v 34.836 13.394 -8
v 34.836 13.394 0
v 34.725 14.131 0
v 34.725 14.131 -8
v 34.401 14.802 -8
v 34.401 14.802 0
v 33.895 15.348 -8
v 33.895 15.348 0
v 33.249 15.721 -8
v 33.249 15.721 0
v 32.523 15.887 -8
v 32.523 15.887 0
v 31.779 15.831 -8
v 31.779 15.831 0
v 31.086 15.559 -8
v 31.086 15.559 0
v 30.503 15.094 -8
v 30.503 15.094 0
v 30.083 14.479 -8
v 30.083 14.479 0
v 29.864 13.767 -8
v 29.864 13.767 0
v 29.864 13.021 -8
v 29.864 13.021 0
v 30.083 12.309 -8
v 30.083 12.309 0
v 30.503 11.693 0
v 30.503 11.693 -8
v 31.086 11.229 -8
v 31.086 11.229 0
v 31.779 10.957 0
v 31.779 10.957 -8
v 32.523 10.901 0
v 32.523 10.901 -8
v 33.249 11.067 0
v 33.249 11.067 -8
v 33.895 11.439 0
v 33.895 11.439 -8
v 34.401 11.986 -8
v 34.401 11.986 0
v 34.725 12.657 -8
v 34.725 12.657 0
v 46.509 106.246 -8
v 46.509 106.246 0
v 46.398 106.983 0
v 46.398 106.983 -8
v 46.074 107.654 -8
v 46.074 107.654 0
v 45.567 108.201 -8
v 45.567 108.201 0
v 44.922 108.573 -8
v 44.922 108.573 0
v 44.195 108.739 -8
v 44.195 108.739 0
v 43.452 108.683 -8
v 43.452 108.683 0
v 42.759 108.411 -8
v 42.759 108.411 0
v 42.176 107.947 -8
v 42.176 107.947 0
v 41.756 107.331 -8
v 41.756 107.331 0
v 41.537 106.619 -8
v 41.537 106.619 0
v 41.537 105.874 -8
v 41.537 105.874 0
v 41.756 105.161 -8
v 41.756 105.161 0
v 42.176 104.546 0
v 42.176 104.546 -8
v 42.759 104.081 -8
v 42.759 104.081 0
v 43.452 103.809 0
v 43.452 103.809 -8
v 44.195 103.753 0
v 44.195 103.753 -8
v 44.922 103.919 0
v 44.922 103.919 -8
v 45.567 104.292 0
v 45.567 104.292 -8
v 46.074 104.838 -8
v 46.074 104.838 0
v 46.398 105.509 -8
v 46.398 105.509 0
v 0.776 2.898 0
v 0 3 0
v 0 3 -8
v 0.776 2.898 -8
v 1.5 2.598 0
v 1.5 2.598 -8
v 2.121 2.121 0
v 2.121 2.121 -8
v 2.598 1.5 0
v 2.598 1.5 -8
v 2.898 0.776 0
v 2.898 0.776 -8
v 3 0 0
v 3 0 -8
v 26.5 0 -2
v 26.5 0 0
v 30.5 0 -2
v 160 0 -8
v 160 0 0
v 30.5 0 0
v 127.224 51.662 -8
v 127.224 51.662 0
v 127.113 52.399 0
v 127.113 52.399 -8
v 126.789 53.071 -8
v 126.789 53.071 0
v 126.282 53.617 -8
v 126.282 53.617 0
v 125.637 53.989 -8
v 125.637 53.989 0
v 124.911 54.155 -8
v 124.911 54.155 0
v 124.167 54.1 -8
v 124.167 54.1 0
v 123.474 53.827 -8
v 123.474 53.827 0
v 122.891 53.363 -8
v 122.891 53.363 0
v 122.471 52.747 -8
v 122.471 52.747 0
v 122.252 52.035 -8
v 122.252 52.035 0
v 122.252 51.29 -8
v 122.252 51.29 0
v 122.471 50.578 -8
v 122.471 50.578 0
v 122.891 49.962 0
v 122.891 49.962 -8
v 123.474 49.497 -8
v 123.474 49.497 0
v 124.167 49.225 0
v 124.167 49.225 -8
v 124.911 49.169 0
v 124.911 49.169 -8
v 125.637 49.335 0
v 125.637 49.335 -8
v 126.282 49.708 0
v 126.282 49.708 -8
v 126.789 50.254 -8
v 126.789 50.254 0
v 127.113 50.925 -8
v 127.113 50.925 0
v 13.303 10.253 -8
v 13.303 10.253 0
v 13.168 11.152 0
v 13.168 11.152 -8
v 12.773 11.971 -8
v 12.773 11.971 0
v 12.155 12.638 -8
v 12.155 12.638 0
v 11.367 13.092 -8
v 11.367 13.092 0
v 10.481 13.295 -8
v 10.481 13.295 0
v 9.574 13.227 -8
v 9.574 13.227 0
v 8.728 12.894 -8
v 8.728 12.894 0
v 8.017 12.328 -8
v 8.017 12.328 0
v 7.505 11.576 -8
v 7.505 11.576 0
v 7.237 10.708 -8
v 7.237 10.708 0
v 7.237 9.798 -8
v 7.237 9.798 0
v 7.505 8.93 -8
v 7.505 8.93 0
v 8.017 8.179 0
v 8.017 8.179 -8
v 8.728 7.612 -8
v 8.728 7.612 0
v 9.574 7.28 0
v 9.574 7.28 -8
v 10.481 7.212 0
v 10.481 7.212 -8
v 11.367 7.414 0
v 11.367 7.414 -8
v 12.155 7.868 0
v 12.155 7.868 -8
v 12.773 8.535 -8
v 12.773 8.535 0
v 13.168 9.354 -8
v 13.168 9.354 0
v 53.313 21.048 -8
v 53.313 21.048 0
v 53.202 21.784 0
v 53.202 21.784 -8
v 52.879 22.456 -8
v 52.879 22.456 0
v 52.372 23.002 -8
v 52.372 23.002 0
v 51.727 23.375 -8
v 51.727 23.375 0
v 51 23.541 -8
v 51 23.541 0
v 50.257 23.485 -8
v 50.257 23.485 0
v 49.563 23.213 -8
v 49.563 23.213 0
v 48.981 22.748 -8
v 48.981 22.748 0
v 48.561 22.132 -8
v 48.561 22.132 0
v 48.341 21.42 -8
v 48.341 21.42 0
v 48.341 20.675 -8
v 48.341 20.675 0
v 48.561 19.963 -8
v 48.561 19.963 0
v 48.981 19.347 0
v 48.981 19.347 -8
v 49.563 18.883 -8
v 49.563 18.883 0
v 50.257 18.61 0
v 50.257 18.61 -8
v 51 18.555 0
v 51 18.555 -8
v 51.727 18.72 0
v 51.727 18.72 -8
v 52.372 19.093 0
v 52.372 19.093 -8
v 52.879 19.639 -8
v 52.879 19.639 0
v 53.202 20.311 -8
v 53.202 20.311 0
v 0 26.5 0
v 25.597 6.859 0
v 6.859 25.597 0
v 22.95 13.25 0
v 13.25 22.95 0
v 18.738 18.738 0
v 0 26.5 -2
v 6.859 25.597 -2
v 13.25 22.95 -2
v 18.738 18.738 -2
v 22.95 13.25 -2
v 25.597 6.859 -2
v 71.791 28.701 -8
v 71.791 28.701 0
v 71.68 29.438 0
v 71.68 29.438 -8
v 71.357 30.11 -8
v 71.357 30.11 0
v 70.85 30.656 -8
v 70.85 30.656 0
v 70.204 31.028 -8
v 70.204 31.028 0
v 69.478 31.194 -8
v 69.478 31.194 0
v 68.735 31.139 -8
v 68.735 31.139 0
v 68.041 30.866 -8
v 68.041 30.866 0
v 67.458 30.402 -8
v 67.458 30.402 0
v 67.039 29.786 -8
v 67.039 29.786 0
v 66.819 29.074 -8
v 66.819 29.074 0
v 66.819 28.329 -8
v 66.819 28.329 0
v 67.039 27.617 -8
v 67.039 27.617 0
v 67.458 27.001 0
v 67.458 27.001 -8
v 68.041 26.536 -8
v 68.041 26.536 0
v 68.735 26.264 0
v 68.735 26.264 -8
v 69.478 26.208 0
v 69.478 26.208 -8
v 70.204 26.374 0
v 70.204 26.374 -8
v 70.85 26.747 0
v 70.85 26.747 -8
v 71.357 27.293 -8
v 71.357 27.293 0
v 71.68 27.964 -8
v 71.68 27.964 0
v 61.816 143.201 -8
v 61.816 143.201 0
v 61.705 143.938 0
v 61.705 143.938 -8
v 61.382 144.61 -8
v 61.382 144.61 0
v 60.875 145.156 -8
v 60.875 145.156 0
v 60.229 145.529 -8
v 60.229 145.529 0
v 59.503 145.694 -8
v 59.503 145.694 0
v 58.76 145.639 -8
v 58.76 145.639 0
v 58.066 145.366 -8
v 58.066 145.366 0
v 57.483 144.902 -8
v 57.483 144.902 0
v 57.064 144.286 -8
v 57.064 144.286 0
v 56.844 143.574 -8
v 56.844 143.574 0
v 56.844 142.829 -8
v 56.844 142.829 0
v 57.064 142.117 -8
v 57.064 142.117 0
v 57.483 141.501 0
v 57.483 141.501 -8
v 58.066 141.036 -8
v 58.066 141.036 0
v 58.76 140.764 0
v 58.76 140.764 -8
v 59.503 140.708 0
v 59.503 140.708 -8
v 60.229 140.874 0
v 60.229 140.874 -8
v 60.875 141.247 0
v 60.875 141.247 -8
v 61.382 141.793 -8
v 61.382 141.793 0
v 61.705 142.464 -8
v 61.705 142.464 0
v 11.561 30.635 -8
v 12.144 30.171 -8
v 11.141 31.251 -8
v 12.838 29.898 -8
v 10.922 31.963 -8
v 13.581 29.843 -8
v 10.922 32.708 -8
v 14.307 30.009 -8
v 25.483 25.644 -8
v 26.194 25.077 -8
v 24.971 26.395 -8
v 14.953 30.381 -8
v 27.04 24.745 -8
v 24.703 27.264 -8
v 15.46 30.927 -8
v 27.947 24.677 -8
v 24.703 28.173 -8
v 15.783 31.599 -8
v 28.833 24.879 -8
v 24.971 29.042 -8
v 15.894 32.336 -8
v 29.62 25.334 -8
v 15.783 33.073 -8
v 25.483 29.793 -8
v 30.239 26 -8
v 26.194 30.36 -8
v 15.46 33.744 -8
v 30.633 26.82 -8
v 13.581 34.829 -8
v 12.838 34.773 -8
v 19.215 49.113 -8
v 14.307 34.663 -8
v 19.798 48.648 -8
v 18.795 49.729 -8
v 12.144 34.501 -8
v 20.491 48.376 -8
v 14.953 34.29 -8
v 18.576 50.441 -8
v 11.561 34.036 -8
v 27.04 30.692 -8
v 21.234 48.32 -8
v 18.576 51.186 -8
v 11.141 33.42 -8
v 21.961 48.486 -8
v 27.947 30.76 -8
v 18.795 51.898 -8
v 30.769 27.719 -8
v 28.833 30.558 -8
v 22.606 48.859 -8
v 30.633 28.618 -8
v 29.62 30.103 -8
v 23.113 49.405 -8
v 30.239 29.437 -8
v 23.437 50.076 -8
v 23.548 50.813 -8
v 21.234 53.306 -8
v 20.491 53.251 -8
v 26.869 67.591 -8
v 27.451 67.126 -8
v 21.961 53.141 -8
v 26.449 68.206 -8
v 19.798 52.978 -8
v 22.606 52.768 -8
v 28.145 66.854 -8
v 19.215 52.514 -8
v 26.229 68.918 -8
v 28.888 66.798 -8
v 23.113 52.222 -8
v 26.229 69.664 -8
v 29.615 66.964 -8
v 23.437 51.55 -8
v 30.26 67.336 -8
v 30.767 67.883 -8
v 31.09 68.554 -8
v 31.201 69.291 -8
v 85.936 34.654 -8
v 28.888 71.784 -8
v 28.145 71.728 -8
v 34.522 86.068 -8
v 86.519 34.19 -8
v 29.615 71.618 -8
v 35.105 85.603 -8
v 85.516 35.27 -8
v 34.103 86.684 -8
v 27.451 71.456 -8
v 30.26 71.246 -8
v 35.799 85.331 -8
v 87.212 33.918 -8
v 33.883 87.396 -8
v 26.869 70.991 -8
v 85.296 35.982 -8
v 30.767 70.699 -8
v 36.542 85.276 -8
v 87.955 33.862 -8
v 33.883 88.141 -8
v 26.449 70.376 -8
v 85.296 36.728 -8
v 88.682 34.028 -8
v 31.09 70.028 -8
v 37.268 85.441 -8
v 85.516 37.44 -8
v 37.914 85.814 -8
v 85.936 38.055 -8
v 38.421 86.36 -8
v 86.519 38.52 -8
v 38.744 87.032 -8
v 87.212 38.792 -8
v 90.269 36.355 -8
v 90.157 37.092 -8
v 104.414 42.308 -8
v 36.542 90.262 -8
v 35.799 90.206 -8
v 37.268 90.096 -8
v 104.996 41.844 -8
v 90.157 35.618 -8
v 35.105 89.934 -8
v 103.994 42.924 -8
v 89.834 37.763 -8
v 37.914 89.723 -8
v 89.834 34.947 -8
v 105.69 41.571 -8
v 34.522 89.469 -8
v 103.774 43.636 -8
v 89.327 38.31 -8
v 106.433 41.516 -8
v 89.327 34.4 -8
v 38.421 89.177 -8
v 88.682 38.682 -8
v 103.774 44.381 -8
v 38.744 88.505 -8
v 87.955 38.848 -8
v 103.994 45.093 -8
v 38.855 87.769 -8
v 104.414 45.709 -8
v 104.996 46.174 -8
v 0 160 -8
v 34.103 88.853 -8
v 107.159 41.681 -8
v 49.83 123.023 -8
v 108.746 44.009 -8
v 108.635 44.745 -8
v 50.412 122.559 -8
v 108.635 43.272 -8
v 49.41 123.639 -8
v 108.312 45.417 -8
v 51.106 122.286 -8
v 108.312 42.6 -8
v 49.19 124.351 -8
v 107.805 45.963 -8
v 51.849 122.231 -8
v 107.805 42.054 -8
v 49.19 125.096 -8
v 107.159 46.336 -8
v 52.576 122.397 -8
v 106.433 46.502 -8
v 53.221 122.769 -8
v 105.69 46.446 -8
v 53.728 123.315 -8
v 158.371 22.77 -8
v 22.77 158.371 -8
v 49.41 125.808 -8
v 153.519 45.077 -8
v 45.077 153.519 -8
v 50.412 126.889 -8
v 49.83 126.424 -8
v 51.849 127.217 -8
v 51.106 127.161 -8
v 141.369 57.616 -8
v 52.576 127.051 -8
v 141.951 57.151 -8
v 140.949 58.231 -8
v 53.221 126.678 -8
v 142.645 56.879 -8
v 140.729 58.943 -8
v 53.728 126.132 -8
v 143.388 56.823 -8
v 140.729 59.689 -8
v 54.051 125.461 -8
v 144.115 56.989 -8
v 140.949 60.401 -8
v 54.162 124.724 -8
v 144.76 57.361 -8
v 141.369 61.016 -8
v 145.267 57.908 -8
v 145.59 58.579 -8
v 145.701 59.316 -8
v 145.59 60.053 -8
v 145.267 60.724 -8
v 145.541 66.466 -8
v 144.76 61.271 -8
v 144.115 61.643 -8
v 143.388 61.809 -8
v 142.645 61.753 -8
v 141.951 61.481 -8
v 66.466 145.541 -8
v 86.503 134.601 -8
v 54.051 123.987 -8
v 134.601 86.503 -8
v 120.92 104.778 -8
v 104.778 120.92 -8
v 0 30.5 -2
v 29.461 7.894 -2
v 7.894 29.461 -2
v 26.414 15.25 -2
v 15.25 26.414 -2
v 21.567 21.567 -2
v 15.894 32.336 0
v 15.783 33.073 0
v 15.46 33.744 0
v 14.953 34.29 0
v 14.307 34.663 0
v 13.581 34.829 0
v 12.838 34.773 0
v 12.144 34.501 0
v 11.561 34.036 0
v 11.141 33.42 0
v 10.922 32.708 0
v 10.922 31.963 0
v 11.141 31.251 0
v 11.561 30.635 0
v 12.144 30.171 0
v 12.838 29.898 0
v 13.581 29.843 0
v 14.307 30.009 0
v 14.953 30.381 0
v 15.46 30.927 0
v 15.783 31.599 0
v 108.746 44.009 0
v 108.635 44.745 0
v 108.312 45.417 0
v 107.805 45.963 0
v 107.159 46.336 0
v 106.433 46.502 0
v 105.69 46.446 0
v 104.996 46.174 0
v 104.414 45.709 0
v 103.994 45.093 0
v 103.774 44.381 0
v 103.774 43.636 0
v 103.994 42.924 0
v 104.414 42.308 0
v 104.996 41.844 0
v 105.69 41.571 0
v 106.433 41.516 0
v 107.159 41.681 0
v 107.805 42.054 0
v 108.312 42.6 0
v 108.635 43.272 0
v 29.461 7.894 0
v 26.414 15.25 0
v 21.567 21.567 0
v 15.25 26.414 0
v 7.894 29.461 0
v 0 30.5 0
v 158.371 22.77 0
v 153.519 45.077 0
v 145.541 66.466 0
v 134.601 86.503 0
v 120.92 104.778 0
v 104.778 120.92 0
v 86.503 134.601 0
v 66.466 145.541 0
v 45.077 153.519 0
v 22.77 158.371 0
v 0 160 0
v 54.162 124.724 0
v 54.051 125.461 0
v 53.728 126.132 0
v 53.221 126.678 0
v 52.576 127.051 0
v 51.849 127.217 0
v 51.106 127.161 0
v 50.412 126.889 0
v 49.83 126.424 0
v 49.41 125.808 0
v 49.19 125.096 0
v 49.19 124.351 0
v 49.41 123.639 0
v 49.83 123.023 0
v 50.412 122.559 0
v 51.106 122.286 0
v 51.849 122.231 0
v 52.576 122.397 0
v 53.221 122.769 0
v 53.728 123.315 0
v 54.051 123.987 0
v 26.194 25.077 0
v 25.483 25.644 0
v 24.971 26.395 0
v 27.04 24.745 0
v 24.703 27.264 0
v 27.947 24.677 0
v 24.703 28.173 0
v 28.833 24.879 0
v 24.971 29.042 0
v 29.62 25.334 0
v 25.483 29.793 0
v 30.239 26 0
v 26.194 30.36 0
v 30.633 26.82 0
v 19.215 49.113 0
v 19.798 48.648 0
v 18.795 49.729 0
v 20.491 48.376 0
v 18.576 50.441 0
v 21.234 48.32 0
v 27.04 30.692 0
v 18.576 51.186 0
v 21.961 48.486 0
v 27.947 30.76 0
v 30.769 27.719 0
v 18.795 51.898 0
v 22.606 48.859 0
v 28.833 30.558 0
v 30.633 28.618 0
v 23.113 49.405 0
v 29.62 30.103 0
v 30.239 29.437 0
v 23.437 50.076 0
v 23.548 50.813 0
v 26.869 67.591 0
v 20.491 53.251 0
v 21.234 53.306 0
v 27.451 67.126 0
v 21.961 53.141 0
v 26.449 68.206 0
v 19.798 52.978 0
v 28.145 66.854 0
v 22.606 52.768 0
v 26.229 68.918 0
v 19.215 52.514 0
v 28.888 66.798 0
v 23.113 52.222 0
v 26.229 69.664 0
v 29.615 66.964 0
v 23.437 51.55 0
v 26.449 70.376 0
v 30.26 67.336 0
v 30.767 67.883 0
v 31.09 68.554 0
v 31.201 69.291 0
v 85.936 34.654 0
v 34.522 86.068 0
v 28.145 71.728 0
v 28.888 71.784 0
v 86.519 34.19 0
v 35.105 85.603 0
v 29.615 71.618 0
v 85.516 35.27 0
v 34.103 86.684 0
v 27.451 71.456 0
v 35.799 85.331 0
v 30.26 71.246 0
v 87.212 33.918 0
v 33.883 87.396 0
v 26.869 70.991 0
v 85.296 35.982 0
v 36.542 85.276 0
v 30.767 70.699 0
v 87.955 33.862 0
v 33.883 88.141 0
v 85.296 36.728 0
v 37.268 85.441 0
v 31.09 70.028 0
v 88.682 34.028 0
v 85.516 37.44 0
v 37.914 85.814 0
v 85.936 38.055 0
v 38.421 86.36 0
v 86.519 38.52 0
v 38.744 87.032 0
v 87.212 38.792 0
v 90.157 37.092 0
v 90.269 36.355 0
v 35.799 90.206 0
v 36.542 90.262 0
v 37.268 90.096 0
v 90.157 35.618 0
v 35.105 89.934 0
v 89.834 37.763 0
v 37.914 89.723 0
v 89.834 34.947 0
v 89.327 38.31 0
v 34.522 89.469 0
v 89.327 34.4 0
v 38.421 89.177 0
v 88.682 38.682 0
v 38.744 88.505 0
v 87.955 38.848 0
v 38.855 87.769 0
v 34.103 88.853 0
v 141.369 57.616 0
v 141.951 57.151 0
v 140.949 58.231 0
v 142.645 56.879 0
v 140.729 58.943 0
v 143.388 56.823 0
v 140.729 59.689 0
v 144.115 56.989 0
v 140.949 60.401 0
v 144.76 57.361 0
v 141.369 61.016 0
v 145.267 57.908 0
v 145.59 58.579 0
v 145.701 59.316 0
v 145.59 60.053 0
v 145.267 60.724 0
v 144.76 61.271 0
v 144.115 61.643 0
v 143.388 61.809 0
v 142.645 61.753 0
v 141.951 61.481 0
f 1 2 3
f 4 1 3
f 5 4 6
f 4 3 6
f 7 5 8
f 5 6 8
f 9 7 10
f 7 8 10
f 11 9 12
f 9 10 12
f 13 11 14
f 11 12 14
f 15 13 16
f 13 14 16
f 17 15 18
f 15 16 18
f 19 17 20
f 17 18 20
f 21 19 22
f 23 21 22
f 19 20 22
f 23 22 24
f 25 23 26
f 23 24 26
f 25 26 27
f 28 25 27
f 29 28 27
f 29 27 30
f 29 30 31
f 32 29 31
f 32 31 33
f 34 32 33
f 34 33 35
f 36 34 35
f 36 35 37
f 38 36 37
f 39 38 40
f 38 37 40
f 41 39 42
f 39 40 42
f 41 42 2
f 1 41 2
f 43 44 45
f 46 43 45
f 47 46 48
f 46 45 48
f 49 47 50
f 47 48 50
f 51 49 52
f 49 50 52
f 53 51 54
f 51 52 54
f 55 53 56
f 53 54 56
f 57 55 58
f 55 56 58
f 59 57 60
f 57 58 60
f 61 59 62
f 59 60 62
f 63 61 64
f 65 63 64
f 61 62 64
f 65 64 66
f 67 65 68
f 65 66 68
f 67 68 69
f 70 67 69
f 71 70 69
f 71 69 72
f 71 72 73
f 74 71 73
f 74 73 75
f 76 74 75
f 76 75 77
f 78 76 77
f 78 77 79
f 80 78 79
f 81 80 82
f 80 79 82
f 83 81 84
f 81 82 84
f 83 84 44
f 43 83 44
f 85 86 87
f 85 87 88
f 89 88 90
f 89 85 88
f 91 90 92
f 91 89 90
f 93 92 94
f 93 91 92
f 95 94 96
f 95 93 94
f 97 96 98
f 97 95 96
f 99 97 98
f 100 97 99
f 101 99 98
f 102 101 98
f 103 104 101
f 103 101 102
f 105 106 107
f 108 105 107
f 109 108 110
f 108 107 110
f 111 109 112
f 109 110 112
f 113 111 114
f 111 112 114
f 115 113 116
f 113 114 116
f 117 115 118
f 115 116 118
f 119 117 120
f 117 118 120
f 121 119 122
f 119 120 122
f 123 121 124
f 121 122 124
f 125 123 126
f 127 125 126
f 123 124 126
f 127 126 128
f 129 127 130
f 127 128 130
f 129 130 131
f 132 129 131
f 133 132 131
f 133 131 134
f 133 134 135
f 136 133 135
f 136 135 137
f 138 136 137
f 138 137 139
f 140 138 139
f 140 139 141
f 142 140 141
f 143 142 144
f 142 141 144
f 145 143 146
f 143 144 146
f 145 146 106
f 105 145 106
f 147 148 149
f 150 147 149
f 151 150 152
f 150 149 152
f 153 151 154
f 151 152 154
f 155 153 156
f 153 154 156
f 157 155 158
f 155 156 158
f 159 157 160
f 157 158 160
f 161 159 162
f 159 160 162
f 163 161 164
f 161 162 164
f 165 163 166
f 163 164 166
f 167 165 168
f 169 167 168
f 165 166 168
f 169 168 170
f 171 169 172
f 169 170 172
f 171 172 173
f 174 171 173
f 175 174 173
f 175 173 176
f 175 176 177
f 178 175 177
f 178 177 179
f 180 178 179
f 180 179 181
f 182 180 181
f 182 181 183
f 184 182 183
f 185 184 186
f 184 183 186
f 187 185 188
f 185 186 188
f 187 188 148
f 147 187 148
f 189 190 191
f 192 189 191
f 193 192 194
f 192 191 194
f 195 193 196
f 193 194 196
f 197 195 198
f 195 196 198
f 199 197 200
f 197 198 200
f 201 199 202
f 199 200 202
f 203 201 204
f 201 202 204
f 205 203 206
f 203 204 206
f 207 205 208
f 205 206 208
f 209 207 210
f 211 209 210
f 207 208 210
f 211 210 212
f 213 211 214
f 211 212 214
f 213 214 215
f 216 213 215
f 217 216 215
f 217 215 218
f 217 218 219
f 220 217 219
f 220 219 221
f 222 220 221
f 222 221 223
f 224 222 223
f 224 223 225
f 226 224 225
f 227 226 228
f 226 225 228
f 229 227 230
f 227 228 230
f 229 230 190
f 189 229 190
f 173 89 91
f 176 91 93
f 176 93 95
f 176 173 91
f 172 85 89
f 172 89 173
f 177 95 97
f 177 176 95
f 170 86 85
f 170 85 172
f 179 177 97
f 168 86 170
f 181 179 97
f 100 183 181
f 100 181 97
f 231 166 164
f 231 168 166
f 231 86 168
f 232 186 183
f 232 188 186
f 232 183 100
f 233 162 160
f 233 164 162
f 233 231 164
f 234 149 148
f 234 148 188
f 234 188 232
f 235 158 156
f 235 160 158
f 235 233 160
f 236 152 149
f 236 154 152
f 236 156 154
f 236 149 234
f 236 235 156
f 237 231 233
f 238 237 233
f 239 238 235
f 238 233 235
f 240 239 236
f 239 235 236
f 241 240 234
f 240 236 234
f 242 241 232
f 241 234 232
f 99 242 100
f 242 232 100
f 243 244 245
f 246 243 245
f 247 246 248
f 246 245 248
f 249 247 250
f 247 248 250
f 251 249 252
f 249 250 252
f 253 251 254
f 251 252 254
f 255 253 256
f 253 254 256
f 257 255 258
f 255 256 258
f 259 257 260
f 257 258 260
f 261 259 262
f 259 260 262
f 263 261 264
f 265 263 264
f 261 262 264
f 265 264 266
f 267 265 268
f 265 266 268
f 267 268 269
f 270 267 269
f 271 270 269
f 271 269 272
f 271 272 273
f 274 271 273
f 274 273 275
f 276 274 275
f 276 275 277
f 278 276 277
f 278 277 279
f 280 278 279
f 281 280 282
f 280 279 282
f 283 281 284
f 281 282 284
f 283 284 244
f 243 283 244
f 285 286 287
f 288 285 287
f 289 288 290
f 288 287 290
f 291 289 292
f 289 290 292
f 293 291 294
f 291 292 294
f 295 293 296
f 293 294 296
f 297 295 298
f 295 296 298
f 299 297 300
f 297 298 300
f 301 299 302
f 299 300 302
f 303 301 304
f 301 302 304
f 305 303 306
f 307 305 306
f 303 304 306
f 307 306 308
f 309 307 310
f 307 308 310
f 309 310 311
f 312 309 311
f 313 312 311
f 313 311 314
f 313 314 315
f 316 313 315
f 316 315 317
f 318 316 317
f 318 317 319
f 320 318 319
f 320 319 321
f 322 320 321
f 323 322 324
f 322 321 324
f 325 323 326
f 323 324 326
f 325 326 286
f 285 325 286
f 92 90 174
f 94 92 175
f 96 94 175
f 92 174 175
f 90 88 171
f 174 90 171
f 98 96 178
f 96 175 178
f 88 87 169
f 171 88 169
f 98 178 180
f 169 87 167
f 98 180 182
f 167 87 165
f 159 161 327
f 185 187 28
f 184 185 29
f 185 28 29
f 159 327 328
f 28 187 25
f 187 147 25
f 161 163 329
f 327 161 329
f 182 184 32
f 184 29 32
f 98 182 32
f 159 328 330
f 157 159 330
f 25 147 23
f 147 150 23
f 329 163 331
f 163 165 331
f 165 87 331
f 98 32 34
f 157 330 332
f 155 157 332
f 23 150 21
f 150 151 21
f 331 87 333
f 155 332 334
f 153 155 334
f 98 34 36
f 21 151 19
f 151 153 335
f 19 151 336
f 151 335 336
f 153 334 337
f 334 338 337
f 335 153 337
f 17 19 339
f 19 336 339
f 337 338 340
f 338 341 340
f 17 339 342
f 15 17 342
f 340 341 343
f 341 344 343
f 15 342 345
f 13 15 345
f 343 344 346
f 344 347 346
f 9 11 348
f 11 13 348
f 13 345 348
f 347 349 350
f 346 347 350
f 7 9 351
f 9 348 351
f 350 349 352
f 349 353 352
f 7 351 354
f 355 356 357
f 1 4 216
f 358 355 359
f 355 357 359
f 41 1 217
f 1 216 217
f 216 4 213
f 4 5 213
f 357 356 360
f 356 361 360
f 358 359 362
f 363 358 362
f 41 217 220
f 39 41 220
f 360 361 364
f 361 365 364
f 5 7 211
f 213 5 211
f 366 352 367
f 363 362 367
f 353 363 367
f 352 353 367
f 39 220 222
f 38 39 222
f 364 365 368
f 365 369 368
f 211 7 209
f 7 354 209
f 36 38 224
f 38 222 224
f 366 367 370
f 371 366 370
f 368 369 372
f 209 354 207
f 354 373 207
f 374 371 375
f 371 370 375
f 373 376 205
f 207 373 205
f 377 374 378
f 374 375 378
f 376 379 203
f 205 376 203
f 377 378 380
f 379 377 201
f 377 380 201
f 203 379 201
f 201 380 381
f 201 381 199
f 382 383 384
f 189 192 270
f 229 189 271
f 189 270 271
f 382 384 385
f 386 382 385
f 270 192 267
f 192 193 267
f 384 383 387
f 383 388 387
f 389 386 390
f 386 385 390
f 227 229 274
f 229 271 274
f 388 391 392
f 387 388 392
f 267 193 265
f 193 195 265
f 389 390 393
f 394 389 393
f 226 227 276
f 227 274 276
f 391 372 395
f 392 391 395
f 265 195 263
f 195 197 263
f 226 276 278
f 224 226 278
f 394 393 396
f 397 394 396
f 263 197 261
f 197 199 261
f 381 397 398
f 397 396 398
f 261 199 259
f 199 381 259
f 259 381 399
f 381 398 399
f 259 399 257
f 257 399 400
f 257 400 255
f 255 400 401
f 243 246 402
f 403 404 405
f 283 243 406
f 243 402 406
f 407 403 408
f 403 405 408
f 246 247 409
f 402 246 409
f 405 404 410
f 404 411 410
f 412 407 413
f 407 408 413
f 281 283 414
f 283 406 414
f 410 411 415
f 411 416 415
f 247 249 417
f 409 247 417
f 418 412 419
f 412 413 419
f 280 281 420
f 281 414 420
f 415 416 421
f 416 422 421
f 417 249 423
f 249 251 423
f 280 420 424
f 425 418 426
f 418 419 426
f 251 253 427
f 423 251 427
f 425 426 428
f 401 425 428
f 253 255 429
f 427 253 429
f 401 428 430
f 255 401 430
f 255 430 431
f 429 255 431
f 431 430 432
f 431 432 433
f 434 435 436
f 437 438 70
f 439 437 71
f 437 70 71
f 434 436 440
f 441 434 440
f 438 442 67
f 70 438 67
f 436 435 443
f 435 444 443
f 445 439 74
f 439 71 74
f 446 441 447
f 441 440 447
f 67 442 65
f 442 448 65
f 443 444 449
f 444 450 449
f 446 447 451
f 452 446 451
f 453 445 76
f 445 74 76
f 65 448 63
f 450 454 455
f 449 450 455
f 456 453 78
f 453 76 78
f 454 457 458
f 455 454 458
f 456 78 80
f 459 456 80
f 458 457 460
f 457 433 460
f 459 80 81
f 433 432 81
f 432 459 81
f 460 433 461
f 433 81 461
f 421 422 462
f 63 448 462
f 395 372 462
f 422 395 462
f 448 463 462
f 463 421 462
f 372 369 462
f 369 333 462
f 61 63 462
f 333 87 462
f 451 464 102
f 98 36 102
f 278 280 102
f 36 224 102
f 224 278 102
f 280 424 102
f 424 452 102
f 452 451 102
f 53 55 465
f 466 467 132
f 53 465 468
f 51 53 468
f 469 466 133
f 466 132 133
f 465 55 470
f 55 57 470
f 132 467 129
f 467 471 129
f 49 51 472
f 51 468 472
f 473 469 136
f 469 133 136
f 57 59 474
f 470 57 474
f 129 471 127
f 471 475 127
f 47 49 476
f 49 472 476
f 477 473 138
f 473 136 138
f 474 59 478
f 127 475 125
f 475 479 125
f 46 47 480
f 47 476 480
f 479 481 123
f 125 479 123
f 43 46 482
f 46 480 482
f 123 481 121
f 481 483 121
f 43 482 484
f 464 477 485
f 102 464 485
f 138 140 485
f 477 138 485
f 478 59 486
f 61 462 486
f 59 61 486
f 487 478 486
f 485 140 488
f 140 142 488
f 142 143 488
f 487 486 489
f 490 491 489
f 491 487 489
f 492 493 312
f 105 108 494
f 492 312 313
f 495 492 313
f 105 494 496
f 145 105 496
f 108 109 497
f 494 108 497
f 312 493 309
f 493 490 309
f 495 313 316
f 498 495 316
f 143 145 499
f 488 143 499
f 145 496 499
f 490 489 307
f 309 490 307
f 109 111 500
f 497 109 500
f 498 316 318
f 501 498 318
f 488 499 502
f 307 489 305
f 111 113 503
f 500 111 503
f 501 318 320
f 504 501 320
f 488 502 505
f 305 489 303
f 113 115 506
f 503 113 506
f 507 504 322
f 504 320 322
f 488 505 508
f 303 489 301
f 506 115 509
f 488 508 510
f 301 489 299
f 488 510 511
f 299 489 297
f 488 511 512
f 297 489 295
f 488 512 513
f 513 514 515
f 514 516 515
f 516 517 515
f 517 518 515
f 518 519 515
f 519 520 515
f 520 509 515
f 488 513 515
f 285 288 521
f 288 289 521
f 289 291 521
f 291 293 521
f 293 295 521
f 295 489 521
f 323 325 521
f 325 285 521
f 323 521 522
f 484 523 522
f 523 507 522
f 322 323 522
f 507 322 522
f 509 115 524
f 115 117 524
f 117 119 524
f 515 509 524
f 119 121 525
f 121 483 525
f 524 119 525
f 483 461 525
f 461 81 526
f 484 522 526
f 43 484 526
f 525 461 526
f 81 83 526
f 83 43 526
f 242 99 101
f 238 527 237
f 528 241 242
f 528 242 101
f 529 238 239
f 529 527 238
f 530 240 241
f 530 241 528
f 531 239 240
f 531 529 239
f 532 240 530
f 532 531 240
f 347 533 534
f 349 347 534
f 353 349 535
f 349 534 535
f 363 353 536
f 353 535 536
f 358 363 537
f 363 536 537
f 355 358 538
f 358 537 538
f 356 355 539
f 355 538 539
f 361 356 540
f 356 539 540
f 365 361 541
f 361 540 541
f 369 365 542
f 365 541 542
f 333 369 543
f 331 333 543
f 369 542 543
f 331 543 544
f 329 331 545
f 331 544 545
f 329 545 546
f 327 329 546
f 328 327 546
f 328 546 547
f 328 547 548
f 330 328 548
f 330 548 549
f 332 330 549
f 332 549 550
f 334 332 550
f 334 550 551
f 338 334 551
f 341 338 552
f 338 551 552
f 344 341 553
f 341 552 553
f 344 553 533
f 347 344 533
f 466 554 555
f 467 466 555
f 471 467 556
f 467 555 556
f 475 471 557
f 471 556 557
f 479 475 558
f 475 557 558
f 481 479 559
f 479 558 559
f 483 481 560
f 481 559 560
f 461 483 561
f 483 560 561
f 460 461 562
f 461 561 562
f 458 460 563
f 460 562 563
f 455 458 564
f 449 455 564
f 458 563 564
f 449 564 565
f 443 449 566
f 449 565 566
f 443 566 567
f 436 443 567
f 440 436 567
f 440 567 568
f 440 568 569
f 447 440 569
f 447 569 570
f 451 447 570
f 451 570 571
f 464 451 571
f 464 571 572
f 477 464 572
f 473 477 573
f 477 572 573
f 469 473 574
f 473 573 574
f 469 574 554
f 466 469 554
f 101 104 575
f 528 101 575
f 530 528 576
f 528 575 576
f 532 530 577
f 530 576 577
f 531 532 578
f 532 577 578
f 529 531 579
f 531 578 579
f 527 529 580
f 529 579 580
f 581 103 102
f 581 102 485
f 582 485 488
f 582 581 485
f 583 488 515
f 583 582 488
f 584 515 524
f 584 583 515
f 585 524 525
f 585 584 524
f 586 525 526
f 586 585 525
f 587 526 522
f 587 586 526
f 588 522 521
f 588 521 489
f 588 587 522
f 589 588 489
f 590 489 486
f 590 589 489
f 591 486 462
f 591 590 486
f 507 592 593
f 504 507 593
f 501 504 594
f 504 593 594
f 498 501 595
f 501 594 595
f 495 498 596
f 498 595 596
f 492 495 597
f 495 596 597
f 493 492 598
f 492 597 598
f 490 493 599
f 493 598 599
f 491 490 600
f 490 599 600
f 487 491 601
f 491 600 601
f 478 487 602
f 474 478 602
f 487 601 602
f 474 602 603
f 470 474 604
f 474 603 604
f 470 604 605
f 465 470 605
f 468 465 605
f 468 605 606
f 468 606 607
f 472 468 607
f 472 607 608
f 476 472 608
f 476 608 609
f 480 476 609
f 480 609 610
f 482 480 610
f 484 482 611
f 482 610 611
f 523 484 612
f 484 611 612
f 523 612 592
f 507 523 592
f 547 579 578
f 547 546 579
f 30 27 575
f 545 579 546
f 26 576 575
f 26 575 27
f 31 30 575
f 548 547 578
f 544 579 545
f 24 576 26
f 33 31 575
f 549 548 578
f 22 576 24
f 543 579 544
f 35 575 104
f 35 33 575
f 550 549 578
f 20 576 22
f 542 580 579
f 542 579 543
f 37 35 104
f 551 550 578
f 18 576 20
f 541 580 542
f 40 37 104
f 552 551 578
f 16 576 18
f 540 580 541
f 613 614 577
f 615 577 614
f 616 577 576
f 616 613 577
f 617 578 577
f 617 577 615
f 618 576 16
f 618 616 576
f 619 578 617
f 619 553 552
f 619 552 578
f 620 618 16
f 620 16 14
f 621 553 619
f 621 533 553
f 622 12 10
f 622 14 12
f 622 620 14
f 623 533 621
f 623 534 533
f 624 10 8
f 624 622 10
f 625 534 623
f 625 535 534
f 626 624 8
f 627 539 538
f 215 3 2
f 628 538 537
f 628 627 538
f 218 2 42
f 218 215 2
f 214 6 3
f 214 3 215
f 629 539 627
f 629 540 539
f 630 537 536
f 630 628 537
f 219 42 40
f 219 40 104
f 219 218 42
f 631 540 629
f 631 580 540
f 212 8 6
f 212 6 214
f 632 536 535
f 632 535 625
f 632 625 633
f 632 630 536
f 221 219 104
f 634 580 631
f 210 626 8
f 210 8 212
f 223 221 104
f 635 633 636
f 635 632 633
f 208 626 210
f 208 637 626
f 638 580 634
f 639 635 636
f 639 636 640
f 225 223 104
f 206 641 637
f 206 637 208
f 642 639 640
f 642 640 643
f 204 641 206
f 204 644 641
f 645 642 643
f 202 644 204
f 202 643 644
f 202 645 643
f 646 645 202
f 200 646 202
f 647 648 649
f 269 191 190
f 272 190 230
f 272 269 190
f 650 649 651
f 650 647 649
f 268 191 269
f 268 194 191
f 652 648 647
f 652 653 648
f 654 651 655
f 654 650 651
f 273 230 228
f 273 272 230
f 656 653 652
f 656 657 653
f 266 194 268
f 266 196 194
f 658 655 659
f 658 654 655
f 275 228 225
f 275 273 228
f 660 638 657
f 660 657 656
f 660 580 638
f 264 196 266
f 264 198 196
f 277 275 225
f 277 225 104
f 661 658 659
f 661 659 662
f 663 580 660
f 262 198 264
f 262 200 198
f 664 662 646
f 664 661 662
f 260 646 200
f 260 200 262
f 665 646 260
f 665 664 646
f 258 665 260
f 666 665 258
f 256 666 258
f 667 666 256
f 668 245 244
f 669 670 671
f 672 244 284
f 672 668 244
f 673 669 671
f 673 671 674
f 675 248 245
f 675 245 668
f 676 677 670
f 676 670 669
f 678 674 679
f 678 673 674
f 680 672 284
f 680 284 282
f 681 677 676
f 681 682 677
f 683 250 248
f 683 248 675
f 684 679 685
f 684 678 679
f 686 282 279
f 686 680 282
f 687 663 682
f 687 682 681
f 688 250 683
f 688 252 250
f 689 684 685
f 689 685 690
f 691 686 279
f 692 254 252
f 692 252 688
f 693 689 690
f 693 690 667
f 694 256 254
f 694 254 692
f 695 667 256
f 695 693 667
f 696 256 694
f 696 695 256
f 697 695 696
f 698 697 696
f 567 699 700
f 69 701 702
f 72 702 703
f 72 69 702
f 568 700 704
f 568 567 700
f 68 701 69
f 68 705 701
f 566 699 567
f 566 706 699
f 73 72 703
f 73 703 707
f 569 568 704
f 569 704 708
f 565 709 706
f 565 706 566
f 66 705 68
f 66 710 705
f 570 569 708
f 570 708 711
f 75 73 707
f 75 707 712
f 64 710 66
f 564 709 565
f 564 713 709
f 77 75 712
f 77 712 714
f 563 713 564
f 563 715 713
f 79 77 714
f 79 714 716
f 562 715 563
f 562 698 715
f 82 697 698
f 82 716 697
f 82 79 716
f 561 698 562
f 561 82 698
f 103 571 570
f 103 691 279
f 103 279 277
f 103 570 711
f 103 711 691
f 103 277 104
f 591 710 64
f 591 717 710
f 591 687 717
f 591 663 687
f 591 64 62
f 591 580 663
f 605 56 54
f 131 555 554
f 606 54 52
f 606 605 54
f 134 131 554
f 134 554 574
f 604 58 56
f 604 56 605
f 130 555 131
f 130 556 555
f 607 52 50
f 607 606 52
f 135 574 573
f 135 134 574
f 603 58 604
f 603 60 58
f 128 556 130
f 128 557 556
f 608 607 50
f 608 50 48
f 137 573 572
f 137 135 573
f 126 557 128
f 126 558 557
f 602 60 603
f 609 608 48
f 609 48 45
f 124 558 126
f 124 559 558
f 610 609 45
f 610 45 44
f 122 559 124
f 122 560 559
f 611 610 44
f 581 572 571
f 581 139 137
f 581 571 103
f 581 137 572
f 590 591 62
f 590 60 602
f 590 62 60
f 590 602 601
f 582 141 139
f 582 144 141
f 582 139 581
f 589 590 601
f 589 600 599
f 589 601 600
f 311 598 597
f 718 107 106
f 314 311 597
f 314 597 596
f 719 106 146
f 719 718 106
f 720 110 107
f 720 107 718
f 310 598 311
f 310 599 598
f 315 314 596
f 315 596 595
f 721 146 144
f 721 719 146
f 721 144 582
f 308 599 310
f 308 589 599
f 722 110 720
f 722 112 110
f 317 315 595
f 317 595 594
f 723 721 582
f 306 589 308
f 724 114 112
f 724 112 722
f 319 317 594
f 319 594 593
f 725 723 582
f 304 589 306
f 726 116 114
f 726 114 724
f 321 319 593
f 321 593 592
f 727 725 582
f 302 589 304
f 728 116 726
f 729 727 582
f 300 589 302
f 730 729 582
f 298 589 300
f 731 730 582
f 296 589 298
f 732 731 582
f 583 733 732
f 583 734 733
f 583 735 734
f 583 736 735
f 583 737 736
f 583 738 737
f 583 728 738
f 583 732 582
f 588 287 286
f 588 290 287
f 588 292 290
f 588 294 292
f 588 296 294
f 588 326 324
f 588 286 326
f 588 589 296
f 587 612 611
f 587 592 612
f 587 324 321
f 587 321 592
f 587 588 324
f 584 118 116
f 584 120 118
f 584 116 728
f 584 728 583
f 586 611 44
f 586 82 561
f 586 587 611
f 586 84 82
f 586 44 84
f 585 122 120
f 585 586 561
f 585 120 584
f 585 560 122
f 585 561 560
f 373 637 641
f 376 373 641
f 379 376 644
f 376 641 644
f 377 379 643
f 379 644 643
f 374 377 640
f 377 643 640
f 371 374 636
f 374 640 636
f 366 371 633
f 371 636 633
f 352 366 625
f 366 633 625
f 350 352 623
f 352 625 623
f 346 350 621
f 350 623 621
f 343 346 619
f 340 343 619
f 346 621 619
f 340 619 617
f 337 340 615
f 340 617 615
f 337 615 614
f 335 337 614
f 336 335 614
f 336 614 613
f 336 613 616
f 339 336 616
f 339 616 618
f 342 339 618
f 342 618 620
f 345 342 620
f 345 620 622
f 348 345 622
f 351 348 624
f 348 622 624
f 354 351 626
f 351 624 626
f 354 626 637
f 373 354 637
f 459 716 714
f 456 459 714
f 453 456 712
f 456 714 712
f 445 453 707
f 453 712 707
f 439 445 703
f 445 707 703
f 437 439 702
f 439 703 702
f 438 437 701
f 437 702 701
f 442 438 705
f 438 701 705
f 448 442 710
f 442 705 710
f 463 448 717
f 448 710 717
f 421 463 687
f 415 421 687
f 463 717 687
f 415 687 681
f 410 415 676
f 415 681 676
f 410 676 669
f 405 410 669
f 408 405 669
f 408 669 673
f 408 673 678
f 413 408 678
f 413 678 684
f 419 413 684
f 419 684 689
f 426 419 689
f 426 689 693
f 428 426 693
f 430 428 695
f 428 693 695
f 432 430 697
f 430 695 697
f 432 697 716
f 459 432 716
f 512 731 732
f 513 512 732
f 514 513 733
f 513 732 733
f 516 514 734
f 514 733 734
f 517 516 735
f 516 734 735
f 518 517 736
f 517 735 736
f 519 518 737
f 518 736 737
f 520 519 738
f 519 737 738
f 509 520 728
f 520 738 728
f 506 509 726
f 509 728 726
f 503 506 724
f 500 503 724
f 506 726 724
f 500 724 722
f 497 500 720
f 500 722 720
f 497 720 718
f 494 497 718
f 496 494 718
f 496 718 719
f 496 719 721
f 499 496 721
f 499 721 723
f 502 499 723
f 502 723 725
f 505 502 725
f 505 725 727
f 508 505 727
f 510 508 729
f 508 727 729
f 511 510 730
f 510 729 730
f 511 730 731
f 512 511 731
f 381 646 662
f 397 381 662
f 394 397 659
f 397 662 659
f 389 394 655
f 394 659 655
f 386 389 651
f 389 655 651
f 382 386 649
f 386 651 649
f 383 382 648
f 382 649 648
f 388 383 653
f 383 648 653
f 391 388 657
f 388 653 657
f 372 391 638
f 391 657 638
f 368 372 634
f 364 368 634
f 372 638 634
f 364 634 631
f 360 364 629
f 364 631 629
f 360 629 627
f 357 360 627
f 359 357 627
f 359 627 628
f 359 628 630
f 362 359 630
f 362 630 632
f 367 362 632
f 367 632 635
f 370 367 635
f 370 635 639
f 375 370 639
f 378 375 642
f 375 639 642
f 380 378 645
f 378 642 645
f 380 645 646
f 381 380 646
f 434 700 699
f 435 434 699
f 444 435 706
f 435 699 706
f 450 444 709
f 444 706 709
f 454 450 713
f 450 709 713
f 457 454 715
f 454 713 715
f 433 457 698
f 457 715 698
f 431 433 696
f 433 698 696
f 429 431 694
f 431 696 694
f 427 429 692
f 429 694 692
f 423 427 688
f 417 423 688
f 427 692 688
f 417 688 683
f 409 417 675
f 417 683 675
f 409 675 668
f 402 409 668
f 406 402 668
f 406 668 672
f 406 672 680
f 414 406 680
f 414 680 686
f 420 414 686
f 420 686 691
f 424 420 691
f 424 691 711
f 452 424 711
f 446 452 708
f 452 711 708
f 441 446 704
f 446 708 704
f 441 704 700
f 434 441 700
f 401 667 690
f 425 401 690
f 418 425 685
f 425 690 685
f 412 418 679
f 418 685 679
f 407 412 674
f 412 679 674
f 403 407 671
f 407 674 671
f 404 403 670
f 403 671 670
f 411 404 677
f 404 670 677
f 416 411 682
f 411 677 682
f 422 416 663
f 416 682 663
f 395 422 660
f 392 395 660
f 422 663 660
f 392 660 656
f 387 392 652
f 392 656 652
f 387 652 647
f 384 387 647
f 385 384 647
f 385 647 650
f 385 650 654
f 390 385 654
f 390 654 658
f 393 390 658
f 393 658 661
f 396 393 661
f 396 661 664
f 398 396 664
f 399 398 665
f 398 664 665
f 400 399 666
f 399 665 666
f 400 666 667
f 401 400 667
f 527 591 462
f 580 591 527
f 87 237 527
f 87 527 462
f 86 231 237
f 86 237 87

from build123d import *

# Parameters (mm, degrees)
F0_R     = 2.5
F0_R_2   = 3.05
F1_DEPTH = 8
F2_DEPTH = 2


with BuildPart() as f1:
    # F0 (on Top) → F1 (new body)
    with BuildSketch(Plane.XY):
        with BuildLine():
            Line((30.5, 0), (160, 0))
            ThreePointArc((160, 0), (113.137085, 113.137085), (0, 160))
            Line((0, 160), (0, 30.5))
            ThreePointArc((0, 30.5), (21.566757, 21.566757), (30.5, 0))
        make_face()
        with Locations((32.335784, 13.39392)):
            Circle(F0_R, mode=Mode.SUBTRACT)
        with Locations((13.39392, 32.335784)):
            Circle(F0_R, mode=Mode.SUBTRACT)
        with Locations((27.718586, 27.718586)):
            Circle(F0_R_2, mode=Mode.SUBTRACT)
        with Locations((50.813374, 21.047589)):
            Circle(F0_R, mode=Mode.SUBTRACT)
        with Locations((69.290965, 28.701257)):
            Circle(F0_R, mode=Mode.SUBTRACT)
        with Locations((21.047589, 50.813374)):
            Circle(F0_R, mode=Mode.SUBTRACT)
        with Locations((28.701257, 69.290965)):
            Circle(F0_R, mode=Mode.SUBTRACT)
        with Locations((87.768556, 36.354926)):
            Circle(F0_R, mode=Mode.SUBTRACT)
        with Locations((106.246146, 44.008595)):
            Circle(F0_R, mode=Mode.SUBTRACT)
        with Locations((124.723737, 51.662263)):
            Circle(F0_R, mode=Mode.SUBTRACT)
        with Locations((143.201328, 59.315932)):
            Circle(F0_R, mode=Mode.SUBTRACT)
        with Locations((36.354926, 87.768556)):
            Circle(F0_R, mode=Mode.SUBTRACT)
        with Locations((44.008595, 106.246146)):
            Circle(F0_R, mode=Mode.SUBTRACT)
        with Locations((51.662263, 124.723737)):
            Circle(F0_R, mode=Mode.SUBTRACT)
        with Locations((59.315932, 143.201328)):
            Circle(F0_R, mode=Mode.SUBTRACT)
        with BuildLine():
            Line((3, 0), (26.5, 0))
            ThreePointArc((26.5, 0), (18.73833, 18.73833), (0, 26.5))
            Line((0, 26.5), (0, 3))
            ThreePointArc((0, 3), (2.12132, 2.12132), (3, 0))
        make_face()
        with Locations((10.253048, 10.253048)):
            Circle(F0_R_2, mode=Mode.SUBTRACT)
        with BuildLine():
            Line((26.5, 0), (30.5, 0))
            ThreePointArc((30.5, 0), (21.566757, 21.566757), (0, 30.5))
            Line((0, 30.5), (0, 26.5))
            ThreePointArc((0, 26.5), (18.73833, 18.73833), (26.5, 0))
        make_face()
    extrude(amount=-F1_DEPTH)

    # F0 (on Top) → F2 (cut)
    with BuildSketch(Plane.XY):
        with BuildLine():
            Line((26.5, 0), (30.5, 0))
            ThreePointArc((30.5, 0), (21.566757, 21.566757), (0, 30.5))
            Line((0, 30.5), (0, 26.5))
            ThreePointArc((0, 26.5), (18.73833, 18.73833), (26.5, 0))
        make_face()
    extrude(amount=-F2_DEPTH, mode=Mode.SUBTRACT)


solid = f1.part
